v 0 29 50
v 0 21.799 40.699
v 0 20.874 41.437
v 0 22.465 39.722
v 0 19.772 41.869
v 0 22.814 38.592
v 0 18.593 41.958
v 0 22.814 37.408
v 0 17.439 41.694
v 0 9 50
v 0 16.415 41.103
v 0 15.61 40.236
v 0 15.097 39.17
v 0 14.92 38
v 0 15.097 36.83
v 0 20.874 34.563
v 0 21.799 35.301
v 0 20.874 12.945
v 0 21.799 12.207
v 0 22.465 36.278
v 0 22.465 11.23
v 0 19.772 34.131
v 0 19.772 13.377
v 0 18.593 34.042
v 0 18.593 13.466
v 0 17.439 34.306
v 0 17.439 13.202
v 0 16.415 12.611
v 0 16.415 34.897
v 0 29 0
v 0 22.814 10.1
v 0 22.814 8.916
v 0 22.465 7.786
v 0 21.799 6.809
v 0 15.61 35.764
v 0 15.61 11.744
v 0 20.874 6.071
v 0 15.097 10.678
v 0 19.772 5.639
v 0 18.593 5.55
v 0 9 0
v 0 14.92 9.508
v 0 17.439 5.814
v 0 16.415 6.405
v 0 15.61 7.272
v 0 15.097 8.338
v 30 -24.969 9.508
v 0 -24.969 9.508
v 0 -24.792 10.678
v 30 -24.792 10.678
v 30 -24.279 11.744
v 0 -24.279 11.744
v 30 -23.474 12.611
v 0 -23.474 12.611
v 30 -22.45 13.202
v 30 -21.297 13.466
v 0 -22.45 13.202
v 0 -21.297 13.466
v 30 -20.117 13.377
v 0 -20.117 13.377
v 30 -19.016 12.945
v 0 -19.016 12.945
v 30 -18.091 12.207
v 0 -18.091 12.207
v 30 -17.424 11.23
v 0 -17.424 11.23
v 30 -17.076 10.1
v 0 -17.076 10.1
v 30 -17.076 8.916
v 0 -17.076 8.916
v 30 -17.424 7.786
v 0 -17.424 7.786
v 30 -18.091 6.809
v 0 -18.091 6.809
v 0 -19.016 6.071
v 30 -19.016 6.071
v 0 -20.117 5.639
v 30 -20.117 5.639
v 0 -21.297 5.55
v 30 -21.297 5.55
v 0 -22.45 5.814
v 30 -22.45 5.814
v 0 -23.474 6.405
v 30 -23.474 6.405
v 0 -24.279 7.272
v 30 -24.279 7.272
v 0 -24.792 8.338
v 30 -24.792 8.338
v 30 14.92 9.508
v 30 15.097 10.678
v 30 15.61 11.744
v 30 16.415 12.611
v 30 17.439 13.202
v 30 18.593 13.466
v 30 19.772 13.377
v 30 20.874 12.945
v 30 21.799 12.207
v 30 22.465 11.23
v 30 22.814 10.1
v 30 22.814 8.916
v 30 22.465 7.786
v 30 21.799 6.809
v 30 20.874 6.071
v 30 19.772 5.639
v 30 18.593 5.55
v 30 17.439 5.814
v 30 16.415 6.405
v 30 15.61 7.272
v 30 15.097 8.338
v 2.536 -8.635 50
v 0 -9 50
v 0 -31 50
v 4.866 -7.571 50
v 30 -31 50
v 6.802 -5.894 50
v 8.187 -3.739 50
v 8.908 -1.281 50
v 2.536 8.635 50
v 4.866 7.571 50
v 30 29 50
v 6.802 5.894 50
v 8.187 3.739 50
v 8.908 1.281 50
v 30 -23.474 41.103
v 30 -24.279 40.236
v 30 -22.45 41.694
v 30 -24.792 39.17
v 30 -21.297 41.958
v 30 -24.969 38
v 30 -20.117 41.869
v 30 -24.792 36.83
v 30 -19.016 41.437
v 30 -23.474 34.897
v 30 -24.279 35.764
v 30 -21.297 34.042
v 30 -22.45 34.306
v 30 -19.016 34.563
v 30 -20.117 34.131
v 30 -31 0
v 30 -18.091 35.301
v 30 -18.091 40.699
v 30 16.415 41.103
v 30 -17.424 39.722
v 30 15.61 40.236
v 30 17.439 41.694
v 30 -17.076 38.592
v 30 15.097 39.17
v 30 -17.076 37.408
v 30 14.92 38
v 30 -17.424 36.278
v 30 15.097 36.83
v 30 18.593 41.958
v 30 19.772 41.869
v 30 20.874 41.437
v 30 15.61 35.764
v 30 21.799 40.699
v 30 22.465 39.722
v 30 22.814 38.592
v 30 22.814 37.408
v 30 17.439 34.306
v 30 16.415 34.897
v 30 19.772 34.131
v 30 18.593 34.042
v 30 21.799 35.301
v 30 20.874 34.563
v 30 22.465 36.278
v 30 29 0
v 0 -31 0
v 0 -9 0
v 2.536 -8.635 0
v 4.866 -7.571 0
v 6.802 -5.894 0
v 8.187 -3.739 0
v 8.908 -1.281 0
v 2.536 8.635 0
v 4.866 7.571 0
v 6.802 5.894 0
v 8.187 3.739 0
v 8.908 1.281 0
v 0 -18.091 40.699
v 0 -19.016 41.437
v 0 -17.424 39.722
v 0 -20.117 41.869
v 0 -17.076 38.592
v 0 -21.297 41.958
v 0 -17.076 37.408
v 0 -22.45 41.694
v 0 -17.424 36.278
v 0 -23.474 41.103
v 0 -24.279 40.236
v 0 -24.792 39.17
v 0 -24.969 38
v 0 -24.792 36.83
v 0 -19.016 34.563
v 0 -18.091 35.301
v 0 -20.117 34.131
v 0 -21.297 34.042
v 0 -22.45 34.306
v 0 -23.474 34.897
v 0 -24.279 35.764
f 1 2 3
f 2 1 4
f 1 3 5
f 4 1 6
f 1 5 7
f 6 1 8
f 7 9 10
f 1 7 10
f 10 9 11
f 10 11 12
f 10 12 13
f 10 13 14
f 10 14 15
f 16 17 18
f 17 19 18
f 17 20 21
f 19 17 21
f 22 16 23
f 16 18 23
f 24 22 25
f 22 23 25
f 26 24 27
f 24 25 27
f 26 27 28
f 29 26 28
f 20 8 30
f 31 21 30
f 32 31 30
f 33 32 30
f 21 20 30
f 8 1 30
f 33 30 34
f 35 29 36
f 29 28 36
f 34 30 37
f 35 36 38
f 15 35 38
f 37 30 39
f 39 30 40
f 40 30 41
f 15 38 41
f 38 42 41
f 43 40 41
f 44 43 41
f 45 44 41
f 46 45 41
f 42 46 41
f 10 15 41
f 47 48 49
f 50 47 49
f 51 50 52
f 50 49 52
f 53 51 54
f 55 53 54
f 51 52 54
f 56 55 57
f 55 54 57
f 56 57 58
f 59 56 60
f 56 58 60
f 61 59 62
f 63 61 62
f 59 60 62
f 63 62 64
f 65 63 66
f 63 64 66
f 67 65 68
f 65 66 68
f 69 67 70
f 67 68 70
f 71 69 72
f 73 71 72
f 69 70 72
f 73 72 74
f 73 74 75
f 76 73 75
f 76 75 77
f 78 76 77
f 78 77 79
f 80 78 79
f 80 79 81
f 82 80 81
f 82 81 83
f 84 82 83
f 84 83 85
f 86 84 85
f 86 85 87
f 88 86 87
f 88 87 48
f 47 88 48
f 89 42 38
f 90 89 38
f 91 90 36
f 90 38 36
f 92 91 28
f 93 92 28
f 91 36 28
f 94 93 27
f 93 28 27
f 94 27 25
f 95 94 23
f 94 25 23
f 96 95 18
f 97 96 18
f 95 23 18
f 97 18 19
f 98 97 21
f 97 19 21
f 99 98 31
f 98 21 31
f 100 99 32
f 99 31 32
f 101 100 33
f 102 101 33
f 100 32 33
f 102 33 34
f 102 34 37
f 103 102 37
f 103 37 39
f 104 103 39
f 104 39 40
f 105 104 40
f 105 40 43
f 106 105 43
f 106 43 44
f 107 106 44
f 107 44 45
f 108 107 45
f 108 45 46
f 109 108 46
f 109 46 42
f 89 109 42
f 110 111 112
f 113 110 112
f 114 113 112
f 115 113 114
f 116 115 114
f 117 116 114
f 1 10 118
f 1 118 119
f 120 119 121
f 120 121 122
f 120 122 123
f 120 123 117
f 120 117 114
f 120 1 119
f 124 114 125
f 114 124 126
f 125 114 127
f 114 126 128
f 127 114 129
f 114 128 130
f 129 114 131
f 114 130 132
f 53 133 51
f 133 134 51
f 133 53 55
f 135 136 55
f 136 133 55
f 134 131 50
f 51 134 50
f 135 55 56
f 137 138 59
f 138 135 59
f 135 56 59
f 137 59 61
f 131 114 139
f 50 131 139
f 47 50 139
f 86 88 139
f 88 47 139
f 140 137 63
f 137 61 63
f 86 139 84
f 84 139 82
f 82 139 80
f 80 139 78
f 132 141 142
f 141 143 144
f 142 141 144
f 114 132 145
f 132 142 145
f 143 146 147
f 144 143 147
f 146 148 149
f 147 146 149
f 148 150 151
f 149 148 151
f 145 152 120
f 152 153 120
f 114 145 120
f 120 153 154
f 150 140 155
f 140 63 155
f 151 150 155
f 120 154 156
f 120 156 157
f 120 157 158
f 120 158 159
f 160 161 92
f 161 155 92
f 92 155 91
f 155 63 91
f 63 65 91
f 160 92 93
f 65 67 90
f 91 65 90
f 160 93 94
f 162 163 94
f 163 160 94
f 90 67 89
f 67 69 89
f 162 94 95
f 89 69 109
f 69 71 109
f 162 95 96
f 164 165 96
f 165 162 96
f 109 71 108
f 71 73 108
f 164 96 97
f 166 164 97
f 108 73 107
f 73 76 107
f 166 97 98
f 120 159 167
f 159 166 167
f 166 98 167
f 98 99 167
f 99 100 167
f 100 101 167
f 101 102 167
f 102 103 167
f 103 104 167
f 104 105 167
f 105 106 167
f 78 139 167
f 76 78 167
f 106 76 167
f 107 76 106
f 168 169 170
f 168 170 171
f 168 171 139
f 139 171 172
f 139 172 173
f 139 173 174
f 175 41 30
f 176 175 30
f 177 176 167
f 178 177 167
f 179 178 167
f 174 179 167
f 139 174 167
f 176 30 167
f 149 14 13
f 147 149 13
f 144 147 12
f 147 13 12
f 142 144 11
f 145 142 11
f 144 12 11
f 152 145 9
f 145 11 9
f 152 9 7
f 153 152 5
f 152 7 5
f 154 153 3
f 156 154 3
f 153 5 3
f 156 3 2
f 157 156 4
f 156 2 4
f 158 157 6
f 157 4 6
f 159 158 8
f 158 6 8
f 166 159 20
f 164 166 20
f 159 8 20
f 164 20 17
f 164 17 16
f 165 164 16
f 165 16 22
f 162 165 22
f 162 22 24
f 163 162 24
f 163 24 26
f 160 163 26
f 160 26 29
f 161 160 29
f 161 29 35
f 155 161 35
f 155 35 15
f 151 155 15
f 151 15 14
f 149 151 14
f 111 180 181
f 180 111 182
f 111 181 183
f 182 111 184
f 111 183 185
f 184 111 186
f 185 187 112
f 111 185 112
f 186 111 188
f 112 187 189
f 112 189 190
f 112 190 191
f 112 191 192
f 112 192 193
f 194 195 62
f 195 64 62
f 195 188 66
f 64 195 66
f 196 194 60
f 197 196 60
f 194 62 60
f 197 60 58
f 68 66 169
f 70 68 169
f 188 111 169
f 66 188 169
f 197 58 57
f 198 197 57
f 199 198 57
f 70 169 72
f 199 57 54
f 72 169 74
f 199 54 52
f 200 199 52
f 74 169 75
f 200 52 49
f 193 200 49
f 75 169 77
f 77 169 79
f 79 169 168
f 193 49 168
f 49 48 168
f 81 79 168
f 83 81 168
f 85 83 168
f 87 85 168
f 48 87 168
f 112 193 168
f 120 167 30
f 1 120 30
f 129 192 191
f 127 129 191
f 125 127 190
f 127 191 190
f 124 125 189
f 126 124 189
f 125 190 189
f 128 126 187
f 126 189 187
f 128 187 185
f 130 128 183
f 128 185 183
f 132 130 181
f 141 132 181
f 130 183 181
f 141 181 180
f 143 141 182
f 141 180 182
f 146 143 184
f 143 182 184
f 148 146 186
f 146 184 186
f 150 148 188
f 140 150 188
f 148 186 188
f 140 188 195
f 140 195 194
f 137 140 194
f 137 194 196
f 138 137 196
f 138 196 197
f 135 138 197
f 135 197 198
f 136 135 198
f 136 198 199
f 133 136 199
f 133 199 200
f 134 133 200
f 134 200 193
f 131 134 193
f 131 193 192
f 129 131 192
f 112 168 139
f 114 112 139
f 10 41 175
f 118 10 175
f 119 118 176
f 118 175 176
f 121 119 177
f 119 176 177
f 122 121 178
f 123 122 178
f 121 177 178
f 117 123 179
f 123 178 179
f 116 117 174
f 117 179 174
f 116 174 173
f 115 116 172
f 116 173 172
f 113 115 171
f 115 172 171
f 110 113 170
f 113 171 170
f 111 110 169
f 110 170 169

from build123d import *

# Parameters (mm, degrees)
F1_DEPTH = 50
F3_D     = 7.9375


with BuildPart() as f1:
    # F0 (on Top) → F1 (new body)
    with BuildSketch(Plane.XY):
        with BuildLine():
            ThreePointArc((0, 9), (9, 0), (0, -9))
            Line((0, -9), (0, -31))
            Line((0, -31), (30, -31))
            Line((30, -31), (30, 29))
            Line((30, 29), (0, 29))
            Line((0, 29), (0, 9))
        make_face()
    extrude(amount=F1_DEPTH)

    # F3 (through all)
    with Locations(Plane.YZ.offset(30)):
        with Locations((-21, 38), (-21, 9.508006103), (18.8892395088, 38), (18.8892395088, 9.508006103)):
            Hole(F3_D / 2)


solid = f1.part
